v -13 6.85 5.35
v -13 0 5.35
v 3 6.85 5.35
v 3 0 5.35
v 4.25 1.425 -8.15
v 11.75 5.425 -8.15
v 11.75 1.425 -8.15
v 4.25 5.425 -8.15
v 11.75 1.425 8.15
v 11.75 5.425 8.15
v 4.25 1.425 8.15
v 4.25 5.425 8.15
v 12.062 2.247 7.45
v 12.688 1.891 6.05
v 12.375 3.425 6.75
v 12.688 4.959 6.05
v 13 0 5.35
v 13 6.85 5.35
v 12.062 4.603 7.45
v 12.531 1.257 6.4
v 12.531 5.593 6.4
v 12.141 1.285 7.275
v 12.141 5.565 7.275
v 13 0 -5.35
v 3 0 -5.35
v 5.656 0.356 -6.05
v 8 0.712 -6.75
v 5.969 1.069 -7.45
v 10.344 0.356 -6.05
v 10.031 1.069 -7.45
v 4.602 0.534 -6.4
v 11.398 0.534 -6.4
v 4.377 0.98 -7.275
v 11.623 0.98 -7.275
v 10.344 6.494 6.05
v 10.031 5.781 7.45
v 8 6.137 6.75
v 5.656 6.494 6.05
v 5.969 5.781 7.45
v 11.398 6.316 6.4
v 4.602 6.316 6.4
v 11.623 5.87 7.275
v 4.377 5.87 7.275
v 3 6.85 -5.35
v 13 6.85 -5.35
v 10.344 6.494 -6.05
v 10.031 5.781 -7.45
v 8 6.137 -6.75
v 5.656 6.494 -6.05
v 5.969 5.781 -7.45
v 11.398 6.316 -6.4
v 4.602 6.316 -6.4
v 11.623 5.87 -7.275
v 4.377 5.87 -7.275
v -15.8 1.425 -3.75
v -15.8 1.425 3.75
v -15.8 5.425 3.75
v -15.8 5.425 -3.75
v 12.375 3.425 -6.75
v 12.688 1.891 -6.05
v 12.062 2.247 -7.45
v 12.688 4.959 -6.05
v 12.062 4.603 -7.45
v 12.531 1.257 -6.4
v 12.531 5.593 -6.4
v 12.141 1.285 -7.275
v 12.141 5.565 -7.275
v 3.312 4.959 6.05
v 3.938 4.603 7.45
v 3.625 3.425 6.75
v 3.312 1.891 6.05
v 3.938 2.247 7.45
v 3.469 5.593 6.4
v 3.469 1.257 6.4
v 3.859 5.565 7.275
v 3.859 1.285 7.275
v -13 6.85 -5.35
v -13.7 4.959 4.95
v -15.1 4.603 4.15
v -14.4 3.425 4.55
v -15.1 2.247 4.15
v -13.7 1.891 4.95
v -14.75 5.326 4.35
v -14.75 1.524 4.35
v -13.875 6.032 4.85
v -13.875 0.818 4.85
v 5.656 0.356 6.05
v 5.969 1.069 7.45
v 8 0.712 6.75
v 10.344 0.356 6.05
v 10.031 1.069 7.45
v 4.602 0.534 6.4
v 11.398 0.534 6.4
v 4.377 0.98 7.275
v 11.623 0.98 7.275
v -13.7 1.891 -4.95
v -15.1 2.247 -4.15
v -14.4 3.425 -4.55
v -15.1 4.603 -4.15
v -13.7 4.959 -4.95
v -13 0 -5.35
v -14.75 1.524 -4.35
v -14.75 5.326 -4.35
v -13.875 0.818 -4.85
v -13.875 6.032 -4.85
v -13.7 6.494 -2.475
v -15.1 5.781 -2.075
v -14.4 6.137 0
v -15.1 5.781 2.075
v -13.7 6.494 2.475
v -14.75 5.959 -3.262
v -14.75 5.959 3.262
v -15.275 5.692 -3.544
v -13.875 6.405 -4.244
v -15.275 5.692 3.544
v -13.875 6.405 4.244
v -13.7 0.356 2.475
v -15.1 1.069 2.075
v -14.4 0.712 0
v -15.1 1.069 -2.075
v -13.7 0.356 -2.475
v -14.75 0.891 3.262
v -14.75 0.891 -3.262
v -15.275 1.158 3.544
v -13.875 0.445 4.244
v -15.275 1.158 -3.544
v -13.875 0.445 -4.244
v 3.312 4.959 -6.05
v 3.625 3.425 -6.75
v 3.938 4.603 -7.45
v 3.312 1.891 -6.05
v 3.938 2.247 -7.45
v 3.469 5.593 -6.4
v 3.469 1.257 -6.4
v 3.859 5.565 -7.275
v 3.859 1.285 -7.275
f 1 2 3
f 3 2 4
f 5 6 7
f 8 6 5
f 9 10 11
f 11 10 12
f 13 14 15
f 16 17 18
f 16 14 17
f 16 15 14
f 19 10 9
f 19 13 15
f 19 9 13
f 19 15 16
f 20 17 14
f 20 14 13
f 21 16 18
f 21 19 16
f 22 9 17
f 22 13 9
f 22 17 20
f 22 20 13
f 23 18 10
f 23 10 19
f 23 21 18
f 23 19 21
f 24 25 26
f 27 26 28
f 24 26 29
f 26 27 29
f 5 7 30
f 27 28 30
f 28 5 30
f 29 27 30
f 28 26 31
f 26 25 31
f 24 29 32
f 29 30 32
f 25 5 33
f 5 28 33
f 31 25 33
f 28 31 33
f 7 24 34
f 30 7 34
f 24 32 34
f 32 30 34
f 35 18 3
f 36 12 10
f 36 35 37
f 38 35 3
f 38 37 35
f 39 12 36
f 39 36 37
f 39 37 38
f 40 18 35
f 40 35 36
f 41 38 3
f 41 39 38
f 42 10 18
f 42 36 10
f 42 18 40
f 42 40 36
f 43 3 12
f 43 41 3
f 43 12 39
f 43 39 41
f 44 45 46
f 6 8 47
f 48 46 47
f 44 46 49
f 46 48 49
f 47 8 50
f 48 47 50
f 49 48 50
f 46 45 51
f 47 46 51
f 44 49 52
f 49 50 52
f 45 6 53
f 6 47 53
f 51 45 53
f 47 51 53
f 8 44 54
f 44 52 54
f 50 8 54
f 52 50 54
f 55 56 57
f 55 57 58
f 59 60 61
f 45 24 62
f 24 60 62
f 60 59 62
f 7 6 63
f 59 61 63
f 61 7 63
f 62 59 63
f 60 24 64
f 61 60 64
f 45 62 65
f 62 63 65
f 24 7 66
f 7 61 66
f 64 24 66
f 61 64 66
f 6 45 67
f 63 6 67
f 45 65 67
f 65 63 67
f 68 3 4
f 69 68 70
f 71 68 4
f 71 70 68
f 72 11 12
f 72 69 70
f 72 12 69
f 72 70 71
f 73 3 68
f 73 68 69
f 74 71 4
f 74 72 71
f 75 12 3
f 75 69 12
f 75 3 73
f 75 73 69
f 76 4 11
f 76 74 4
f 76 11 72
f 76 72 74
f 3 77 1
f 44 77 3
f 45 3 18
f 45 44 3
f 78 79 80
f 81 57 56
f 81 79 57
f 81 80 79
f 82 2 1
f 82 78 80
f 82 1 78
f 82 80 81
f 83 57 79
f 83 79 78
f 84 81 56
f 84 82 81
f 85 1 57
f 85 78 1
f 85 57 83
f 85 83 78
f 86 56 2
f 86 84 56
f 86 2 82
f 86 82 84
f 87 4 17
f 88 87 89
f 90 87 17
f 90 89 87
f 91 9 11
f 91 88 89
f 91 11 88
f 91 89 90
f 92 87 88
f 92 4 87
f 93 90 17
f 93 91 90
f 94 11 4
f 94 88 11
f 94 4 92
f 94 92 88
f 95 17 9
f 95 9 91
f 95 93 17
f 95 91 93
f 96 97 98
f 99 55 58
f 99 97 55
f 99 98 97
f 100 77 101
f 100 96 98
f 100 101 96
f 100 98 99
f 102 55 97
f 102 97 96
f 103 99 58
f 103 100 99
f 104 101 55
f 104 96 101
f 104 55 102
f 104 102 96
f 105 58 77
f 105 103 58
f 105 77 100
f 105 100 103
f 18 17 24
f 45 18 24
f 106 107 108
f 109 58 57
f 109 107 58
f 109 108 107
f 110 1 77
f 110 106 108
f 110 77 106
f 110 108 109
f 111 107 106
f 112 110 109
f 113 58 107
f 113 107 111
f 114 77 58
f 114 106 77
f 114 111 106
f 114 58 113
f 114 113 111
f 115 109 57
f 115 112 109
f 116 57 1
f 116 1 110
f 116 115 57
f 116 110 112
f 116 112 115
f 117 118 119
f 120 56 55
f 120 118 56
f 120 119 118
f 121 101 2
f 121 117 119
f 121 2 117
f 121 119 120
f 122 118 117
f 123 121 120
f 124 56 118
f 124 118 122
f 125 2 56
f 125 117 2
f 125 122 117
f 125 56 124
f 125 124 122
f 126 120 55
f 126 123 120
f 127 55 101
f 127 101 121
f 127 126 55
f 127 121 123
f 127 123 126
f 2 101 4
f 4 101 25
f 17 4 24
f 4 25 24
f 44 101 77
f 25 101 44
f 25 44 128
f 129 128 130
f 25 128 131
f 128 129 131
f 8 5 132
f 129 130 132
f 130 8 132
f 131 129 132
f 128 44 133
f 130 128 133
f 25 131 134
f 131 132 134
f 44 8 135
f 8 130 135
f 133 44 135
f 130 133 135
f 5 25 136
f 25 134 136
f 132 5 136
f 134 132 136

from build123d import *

# Parameters (mm, degrees)
SKETCH1_W           = 26
SKETCH1_H           = 10.7
BOSS_EXTRUDE1_DEPTH = 6.85


with BuildPart() as part:
    # Sketch1 → Boss-Extrude1 (new body)
    with BuildSketch(Plane(origin=(0, 0, 0), x_dir=(1, 0, 0), z_dir=(0, 1, 0))):
        Rectangle(SKETCH1_W, SKETCH1_H)
    extrude(amount=BOSS_EXTRUDE1_DEPTH)

    # Sketch2 → section 0 of loft1
    with BuildSketch(Plane.ZY.offset(15.8), mode=Mode.PRIVATE) as loft1_s0:
        with BuildLine():
            Line((3.75, 1.425), (-3.75, 1.425))
            Line((-3.75, 1.425), (-3.75, 5.425))
            Line((-3.75, 5.425), (3.75, 5.425))
            Line((3.75, 5.425), (3.75, 1.425))
        make_face()
    # loft up to a face of the part (loft1)
    loft([loft1_s0.sketch, part.faces().sort_by_distance((-13, 3.425, 0))[0]])

    # Sketch4 → Loft2 section 0
    with BuildSketch(Plane.XY.offset(5.35)):
        with BuildLine():
            Line((13, 6.85), (3, 6.85))
            Line((3, 6.85), (3, 0))
            Line((3, 0), (13, 0))
            Line((13, 0), (13, 6.85))
        make_face()
    # Sketch3 → Loft2 section 1
    with BuildSketch(Plane.XY.offset(8.15)):
        with BuildLine():
            Line((4.25, 1.425), (11.75, 1.425))
            Line((11.75, 1.425), (11.75, 5.425))
            Line((11.75, 5.425), (4.25, 5.425))
            Line((4.25, 5.425), (4.25, 1.425))
        make_face()
    loft2 = loft()

    # Mirror1: Loft2 across plane
    add(loft2.mirror(Plane.XY))


solid = part.part
